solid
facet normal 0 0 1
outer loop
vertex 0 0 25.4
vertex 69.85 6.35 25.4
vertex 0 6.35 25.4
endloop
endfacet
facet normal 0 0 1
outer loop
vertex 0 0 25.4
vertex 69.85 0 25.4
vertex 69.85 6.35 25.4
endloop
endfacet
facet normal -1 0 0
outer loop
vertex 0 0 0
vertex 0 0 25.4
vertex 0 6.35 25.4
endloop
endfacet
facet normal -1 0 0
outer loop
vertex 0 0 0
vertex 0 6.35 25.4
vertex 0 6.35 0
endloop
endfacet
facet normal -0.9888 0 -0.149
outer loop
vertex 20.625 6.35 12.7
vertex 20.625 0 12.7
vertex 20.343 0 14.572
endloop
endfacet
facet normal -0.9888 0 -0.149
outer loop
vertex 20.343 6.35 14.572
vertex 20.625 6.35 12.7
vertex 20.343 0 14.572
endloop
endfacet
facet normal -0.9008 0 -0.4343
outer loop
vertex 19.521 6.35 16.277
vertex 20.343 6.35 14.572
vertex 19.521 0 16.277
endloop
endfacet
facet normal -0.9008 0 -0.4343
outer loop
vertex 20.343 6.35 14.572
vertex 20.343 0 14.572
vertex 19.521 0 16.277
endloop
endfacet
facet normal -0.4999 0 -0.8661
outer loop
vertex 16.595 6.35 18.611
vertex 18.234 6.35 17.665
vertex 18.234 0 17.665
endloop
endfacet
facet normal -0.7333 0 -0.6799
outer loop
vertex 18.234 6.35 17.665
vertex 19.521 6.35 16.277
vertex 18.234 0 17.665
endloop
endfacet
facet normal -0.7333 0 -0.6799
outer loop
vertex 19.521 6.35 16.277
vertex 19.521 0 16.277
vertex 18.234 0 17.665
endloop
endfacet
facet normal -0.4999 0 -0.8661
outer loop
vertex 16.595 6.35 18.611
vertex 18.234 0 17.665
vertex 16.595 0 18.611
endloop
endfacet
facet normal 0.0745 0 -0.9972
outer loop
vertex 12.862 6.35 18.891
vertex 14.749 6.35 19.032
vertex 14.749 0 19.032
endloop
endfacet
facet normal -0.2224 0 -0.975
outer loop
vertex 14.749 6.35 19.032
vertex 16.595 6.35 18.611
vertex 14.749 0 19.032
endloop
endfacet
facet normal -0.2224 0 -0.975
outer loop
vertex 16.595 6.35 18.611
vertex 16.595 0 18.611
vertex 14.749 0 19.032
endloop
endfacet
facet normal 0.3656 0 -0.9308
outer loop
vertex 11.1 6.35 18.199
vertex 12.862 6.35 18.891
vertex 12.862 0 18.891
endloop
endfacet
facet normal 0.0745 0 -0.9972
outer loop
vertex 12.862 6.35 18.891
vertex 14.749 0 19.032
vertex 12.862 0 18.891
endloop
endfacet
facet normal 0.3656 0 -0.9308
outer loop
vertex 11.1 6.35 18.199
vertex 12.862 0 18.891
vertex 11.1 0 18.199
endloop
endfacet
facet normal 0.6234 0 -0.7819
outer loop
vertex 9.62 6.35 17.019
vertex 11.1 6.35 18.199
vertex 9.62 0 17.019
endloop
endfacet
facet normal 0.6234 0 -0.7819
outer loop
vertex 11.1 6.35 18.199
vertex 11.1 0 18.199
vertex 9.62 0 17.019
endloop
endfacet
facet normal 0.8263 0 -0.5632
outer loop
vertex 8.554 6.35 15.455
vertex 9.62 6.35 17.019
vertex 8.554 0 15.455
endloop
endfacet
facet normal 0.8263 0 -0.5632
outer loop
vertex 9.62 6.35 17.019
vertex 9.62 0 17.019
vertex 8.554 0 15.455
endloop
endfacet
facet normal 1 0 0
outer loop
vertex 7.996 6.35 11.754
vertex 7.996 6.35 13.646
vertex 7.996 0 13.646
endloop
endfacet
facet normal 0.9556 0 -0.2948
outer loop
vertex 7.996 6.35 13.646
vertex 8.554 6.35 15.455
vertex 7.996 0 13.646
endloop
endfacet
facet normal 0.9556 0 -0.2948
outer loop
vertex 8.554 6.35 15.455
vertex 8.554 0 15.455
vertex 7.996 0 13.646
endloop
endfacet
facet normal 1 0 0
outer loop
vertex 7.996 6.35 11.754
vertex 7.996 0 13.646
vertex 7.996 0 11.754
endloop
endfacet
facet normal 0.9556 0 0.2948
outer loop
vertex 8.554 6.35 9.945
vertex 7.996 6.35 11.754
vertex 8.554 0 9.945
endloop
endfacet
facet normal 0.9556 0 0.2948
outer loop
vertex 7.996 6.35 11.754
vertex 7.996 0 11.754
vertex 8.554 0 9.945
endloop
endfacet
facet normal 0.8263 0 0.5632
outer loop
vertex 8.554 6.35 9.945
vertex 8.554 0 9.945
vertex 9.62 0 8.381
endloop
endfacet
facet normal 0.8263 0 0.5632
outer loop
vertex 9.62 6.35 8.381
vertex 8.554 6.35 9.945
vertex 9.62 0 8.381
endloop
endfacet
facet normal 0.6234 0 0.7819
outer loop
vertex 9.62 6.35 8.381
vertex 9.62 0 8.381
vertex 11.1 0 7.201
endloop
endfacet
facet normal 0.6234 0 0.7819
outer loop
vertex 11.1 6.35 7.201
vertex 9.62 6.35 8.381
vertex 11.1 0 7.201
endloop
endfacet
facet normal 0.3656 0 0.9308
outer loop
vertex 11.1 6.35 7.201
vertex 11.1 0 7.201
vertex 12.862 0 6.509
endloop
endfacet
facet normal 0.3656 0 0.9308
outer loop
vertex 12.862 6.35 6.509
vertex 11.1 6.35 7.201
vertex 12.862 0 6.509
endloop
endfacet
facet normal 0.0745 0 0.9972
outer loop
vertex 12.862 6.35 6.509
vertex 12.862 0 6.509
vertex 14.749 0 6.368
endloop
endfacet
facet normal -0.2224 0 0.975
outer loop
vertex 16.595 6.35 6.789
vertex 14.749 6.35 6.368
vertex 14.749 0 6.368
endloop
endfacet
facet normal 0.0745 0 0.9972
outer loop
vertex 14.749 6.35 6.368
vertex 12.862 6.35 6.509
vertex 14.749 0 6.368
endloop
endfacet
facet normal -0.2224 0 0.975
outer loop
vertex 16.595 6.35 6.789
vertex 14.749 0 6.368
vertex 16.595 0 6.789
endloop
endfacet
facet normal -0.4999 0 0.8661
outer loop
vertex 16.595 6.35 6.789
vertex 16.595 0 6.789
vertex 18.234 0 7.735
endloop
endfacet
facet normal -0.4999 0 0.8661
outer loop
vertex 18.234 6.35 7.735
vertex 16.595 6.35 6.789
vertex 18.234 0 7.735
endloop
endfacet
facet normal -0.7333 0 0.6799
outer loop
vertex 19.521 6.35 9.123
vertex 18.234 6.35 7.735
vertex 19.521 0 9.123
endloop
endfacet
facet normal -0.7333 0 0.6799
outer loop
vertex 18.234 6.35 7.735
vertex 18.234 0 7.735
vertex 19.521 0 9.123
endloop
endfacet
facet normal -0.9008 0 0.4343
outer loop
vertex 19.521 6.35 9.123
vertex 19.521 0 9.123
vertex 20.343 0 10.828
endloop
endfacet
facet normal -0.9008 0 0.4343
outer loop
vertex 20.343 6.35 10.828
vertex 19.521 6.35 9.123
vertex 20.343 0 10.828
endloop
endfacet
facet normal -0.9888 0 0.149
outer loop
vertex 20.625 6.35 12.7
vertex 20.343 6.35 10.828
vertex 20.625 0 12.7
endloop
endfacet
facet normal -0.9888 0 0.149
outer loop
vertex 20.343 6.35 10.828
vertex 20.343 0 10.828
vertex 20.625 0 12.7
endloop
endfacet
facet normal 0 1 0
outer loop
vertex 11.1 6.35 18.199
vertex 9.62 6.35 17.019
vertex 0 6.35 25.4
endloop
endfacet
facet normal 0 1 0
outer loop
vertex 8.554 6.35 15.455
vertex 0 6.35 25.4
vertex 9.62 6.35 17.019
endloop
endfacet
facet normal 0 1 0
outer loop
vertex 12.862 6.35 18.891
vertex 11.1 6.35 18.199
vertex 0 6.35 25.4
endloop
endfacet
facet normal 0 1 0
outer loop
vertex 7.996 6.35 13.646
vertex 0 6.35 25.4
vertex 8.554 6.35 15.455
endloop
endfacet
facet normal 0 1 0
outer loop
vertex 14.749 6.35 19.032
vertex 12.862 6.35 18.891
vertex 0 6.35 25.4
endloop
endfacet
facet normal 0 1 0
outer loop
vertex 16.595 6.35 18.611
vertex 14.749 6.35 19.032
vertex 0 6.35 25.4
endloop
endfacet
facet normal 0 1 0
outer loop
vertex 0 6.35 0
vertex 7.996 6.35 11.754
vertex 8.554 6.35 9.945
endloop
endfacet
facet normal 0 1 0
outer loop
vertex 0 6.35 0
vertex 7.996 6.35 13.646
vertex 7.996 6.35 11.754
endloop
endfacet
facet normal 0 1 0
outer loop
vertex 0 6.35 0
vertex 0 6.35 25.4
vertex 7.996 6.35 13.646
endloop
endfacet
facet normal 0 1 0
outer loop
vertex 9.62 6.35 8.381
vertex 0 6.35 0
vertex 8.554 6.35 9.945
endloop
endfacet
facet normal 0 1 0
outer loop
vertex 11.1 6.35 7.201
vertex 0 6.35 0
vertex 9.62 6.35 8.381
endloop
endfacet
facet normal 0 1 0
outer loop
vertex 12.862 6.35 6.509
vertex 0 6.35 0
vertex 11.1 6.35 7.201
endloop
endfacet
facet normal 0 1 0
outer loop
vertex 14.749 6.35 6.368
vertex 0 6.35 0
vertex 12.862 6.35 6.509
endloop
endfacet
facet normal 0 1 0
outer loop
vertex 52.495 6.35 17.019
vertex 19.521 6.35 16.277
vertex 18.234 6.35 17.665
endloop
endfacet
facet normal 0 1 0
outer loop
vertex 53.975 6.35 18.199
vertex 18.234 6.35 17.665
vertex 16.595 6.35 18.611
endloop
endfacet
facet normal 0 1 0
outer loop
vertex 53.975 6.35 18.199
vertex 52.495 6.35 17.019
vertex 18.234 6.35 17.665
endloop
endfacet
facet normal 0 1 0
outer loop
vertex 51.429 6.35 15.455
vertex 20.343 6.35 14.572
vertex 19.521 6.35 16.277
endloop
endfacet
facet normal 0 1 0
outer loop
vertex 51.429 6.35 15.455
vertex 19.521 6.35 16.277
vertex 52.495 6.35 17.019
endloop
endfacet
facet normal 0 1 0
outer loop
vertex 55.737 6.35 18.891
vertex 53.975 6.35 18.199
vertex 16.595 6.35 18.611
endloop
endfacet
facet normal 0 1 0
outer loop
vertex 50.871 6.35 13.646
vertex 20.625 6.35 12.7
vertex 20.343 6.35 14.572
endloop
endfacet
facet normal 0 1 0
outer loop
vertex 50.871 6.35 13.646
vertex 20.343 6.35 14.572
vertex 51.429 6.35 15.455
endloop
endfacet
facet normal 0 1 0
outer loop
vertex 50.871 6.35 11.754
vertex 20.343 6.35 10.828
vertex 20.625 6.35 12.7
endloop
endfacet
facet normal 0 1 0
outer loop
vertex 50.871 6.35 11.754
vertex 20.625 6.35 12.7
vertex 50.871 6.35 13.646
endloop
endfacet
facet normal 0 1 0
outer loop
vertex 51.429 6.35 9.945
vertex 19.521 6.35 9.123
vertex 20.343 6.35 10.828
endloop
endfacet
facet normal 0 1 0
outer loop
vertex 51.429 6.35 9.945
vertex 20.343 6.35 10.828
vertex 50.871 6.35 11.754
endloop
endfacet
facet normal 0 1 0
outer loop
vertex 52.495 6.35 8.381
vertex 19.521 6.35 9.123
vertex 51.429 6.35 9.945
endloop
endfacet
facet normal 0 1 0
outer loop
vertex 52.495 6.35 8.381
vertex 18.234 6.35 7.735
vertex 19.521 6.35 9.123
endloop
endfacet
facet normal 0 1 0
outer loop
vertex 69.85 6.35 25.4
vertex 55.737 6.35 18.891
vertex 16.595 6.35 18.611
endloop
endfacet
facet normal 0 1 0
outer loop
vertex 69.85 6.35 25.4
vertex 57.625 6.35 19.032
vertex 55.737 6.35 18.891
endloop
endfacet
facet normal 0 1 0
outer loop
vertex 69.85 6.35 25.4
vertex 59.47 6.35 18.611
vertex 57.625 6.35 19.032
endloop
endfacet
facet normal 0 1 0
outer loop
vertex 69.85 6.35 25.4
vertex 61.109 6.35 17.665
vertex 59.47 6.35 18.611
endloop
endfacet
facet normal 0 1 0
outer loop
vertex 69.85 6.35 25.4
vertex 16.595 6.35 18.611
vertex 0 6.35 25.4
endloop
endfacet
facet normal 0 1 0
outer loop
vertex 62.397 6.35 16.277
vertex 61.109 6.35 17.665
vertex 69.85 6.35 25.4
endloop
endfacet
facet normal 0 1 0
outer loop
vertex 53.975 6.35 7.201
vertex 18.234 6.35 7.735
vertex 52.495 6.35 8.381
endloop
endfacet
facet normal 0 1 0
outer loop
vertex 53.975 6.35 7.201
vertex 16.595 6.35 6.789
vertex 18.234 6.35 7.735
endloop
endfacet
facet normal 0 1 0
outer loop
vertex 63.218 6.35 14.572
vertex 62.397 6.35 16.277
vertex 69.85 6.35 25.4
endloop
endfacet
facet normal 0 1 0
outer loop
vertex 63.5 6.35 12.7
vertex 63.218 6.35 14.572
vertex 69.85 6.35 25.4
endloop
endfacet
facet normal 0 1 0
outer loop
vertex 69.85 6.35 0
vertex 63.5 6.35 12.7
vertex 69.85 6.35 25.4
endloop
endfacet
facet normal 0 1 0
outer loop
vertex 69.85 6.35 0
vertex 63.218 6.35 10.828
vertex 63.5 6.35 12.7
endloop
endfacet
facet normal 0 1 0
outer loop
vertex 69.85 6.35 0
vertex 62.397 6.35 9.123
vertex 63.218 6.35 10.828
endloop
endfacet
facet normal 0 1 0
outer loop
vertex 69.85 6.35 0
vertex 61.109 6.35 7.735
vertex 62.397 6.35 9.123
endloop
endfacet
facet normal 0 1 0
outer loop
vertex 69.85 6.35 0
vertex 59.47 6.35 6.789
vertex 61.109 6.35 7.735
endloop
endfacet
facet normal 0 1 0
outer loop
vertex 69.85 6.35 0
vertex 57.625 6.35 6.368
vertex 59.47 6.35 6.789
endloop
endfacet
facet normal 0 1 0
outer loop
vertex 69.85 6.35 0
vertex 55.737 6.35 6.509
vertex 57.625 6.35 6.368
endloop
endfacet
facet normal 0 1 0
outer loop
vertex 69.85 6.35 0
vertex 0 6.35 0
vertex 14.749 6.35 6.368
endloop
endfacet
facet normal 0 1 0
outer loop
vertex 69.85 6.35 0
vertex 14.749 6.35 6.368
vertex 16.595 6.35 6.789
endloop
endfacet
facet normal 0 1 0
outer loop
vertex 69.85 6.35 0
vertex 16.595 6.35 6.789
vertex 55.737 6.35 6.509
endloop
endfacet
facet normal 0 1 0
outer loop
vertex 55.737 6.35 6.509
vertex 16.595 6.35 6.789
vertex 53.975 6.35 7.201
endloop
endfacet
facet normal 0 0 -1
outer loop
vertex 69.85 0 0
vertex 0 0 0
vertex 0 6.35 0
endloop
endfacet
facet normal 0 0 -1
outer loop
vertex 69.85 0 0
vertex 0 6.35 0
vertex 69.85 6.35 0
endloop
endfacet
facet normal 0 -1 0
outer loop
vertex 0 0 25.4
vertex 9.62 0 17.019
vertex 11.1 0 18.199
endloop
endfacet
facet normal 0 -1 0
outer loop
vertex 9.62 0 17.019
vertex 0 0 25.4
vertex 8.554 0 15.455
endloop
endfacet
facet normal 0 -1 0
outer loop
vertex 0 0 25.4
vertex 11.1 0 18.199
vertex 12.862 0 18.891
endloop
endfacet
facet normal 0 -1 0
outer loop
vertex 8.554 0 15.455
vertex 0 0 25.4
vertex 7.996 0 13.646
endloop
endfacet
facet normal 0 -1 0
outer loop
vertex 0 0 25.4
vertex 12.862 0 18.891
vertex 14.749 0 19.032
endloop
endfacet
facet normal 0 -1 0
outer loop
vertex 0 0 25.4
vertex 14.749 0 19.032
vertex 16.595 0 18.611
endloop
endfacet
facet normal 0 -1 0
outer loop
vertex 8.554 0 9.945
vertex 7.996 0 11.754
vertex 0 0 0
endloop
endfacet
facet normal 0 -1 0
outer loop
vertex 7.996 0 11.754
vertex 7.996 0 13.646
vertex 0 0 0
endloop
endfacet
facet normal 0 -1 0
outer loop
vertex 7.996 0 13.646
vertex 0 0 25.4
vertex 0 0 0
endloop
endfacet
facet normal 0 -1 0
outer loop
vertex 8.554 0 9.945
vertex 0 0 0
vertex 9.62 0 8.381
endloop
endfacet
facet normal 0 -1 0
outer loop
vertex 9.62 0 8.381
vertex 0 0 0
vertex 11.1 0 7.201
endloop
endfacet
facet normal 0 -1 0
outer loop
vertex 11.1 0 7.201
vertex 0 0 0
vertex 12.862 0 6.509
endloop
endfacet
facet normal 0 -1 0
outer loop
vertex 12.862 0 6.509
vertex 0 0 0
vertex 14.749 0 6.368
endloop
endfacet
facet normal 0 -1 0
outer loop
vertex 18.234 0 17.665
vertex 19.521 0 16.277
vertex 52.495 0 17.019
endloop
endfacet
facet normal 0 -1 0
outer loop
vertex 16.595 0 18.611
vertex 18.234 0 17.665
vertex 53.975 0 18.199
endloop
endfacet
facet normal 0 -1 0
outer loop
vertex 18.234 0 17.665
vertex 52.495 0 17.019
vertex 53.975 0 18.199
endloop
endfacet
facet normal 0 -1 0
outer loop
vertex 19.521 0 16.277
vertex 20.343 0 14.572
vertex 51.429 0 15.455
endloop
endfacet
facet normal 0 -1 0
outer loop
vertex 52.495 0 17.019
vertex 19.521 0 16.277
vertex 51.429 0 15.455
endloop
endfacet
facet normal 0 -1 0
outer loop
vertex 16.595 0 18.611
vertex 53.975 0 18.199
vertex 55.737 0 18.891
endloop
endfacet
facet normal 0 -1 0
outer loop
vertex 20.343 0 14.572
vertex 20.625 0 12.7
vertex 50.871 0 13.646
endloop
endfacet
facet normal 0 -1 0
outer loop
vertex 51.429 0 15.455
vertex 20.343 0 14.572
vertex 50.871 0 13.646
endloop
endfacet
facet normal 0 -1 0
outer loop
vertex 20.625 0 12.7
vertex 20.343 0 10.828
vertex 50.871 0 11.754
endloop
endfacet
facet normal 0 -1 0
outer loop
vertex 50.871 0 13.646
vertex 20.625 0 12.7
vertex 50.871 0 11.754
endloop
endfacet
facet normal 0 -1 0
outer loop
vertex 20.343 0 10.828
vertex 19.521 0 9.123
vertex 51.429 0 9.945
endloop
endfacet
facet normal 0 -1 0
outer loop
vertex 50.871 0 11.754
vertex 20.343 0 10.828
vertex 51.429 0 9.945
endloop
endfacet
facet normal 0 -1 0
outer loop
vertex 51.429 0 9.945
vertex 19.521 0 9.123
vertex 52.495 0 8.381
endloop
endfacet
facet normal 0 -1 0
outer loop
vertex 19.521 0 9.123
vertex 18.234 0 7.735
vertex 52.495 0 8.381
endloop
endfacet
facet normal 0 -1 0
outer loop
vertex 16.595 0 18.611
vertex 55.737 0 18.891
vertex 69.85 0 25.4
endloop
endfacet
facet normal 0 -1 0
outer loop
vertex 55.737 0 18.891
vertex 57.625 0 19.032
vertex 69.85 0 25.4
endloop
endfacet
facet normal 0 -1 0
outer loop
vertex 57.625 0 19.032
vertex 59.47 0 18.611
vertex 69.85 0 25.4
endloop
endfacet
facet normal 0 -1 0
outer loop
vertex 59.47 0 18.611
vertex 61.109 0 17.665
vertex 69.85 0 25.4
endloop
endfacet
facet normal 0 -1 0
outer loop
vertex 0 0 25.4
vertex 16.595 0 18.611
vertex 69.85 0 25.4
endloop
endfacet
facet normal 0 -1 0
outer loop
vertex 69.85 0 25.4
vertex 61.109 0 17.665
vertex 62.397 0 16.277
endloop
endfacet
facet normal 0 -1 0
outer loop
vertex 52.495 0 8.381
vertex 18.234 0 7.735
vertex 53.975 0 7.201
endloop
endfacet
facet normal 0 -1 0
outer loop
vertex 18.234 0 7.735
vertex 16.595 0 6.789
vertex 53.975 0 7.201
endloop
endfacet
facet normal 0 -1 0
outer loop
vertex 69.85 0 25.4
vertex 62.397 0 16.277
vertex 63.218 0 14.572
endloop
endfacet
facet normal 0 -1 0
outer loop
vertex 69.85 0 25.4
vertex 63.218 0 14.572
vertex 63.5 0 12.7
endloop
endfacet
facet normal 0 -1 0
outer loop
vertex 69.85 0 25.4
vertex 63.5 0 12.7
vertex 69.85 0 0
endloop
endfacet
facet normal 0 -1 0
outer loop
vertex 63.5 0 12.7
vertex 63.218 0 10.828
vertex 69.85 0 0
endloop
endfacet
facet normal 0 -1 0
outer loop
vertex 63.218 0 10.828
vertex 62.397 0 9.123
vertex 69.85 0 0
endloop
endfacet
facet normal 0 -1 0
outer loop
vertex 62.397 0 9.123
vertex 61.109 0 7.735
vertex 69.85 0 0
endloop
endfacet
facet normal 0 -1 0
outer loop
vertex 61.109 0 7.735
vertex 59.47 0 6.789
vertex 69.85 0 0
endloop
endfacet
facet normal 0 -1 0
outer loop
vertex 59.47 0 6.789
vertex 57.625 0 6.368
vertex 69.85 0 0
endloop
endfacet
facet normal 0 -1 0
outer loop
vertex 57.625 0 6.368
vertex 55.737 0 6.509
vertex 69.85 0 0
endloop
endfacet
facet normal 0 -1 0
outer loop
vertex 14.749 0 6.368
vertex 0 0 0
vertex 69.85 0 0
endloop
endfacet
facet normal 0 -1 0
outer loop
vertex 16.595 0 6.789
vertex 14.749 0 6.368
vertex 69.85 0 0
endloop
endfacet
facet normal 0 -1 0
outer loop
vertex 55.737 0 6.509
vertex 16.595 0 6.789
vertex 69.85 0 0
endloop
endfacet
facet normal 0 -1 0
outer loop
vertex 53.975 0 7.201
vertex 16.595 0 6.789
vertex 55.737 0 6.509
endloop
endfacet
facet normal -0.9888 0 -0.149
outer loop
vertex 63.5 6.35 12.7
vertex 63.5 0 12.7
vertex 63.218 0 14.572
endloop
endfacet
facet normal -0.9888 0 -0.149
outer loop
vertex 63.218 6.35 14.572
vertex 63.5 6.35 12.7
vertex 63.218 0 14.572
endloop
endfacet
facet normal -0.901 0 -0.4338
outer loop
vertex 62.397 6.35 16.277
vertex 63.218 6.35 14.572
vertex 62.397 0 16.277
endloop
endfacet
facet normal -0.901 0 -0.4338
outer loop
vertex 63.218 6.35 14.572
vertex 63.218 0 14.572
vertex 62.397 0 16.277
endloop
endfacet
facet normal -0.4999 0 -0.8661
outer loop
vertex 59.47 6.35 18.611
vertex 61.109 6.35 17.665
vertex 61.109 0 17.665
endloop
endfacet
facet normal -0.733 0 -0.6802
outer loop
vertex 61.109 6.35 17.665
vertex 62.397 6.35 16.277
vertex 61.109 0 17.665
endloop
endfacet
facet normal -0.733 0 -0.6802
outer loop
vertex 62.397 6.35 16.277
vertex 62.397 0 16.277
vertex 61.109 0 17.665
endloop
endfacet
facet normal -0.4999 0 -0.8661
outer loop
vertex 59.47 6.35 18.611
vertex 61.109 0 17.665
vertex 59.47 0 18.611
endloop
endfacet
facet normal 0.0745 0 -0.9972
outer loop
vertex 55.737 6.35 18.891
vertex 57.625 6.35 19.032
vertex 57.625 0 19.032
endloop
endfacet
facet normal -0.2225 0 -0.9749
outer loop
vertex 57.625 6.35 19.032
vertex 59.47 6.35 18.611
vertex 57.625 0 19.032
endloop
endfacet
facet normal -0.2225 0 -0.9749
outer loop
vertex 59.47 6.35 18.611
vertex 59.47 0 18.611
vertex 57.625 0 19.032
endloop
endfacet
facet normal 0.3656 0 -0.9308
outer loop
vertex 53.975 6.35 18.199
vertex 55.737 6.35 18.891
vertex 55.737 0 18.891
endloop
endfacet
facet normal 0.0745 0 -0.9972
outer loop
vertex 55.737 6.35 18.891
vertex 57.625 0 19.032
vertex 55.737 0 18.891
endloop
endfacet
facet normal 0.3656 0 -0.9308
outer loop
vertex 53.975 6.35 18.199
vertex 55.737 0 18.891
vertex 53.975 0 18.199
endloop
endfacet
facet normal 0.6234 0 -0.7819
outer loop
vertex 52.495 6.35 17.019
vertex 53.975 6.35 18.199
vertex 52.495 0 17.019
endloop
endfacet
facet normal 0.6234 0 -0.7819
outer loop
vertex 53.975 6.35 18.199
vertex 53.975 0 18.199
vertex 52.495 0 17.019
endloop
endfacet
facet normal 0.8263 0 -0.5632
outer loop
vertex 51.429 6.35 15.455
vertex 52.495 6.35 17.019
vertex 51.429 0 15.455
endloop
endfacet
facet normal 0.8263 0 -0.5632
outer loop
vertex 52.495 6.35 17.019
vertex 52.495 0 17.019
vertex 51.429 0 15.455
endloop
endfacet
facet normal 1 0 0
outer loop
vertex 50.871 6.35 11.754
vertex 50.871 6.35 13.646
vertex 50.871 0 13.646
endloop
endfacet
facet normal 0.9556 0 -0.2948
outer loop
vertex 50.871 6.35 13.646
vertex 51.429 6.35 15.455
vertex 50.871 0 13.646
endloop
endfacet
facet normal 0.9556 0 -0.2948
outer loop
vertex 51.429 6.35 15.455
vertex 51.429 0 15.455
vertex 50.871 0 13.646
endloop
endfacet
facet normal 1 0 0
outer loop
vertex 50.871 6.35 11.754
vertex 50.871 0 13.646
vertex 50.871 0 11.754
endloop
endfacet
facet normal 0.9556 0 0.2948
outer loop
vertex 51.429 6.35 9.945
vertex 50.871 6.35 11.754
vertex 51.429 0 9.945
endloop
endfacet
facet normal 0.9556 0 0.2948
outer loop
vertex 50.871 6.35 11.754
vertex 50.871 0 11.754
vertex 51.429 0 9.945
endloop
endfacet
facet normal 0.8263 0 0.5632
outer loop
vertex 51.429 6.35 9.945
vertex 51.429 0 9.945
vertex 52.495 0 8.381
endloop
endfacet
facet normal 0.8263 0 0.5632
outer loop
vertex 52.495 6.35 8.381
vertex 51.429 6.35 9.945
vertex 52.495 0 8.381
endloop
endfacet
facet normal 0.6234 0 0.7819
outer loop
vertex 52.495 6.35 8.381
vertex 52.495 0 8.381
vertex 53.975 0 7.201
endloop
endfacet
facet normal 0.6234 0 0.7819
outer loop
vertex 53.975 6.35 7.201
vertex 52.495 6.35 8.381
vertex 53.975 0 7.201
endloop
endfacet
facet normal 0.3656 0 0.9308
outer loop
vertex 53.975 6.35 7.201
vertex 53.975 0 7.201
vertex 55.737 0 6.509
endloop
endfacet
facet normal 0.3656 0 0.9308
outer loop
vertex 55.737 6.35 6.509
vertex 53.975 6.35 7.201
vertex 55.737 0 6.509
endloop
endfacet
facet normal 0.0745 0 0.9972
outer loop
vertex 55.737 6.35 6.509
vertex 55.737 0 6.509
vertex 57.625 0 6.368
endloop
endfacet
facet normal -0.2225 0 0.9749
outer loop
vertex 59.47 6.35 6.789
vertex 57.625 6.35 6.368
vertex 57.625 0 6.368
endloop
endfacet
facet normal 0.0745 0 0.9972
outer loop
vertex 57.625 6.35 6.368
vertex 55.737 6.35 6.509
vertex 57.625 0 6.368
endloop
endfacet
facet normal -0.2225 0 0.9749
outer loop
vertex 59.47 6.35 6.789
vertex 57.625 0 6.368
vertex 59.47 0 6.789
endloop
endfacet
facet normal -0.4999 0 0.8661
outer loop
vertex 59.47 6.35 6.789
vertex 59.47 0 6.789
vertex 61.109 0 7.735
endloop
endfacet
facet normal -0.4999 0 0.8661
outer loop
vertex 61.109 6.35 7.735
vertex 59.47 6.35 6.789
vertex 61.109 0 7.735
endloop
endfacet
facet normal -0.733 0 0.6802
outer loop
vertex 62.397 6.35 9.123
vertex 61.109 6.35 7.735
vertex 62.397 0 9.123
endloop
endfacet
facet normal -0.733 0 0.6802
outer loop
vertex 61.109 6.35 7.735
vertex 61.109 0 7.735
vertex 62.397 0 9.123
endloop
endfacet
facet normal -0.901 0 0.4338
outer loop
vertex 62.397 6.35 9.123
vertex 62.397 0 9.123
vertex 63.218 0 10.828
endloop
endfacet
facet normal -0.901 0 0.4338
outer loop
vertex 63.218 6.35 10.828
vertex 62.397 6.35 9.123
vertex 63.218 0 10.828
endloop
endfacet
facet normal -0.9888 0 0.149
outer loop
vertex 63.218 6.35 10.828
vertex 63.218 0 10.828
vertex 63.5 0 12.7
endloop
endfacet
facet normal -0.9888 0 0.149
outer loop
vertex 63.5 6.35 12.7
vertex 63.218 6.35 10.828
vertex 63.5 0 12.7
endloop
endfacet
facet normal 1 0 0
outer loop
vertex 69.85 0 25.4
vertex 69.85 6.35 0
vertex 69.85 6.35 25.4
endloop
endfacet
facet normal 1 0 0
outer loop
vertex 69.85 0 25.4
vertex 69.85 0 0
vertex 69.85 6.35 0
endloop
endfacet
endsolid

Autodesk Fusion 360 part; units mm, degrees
sketch "Sketch1" plane through (0, 0, 0) normal (0, 1, 0) x (1, 0, 0)
  line L0 (0, 0) -> (69.85, 0)
  line L1 (69.85, 0) -> (69.85, -25.4)
  line L2 (69.85, -25.4) -> (0, -25.4)
  line L3 (0, -25.4) -> (0, 0)
  circle A0 centre (57.15, -12.7) radius 6.35
  line L4 (34.925, -25.4) -> (34.925, 0) construction
  circle A1 centre (14.2748, -12.7) radius 6.35
  dimension "d1" = 69.85
  dimension "d2" = 25.4
  dimension "d3" = 12.7
  dimension "d4" = 12.7
  dimension "d5" = 12.7
  dimension "d6" = 14.2748
extrude "Extrude1" add sketch "Sketch1" along normal blind 6.35
